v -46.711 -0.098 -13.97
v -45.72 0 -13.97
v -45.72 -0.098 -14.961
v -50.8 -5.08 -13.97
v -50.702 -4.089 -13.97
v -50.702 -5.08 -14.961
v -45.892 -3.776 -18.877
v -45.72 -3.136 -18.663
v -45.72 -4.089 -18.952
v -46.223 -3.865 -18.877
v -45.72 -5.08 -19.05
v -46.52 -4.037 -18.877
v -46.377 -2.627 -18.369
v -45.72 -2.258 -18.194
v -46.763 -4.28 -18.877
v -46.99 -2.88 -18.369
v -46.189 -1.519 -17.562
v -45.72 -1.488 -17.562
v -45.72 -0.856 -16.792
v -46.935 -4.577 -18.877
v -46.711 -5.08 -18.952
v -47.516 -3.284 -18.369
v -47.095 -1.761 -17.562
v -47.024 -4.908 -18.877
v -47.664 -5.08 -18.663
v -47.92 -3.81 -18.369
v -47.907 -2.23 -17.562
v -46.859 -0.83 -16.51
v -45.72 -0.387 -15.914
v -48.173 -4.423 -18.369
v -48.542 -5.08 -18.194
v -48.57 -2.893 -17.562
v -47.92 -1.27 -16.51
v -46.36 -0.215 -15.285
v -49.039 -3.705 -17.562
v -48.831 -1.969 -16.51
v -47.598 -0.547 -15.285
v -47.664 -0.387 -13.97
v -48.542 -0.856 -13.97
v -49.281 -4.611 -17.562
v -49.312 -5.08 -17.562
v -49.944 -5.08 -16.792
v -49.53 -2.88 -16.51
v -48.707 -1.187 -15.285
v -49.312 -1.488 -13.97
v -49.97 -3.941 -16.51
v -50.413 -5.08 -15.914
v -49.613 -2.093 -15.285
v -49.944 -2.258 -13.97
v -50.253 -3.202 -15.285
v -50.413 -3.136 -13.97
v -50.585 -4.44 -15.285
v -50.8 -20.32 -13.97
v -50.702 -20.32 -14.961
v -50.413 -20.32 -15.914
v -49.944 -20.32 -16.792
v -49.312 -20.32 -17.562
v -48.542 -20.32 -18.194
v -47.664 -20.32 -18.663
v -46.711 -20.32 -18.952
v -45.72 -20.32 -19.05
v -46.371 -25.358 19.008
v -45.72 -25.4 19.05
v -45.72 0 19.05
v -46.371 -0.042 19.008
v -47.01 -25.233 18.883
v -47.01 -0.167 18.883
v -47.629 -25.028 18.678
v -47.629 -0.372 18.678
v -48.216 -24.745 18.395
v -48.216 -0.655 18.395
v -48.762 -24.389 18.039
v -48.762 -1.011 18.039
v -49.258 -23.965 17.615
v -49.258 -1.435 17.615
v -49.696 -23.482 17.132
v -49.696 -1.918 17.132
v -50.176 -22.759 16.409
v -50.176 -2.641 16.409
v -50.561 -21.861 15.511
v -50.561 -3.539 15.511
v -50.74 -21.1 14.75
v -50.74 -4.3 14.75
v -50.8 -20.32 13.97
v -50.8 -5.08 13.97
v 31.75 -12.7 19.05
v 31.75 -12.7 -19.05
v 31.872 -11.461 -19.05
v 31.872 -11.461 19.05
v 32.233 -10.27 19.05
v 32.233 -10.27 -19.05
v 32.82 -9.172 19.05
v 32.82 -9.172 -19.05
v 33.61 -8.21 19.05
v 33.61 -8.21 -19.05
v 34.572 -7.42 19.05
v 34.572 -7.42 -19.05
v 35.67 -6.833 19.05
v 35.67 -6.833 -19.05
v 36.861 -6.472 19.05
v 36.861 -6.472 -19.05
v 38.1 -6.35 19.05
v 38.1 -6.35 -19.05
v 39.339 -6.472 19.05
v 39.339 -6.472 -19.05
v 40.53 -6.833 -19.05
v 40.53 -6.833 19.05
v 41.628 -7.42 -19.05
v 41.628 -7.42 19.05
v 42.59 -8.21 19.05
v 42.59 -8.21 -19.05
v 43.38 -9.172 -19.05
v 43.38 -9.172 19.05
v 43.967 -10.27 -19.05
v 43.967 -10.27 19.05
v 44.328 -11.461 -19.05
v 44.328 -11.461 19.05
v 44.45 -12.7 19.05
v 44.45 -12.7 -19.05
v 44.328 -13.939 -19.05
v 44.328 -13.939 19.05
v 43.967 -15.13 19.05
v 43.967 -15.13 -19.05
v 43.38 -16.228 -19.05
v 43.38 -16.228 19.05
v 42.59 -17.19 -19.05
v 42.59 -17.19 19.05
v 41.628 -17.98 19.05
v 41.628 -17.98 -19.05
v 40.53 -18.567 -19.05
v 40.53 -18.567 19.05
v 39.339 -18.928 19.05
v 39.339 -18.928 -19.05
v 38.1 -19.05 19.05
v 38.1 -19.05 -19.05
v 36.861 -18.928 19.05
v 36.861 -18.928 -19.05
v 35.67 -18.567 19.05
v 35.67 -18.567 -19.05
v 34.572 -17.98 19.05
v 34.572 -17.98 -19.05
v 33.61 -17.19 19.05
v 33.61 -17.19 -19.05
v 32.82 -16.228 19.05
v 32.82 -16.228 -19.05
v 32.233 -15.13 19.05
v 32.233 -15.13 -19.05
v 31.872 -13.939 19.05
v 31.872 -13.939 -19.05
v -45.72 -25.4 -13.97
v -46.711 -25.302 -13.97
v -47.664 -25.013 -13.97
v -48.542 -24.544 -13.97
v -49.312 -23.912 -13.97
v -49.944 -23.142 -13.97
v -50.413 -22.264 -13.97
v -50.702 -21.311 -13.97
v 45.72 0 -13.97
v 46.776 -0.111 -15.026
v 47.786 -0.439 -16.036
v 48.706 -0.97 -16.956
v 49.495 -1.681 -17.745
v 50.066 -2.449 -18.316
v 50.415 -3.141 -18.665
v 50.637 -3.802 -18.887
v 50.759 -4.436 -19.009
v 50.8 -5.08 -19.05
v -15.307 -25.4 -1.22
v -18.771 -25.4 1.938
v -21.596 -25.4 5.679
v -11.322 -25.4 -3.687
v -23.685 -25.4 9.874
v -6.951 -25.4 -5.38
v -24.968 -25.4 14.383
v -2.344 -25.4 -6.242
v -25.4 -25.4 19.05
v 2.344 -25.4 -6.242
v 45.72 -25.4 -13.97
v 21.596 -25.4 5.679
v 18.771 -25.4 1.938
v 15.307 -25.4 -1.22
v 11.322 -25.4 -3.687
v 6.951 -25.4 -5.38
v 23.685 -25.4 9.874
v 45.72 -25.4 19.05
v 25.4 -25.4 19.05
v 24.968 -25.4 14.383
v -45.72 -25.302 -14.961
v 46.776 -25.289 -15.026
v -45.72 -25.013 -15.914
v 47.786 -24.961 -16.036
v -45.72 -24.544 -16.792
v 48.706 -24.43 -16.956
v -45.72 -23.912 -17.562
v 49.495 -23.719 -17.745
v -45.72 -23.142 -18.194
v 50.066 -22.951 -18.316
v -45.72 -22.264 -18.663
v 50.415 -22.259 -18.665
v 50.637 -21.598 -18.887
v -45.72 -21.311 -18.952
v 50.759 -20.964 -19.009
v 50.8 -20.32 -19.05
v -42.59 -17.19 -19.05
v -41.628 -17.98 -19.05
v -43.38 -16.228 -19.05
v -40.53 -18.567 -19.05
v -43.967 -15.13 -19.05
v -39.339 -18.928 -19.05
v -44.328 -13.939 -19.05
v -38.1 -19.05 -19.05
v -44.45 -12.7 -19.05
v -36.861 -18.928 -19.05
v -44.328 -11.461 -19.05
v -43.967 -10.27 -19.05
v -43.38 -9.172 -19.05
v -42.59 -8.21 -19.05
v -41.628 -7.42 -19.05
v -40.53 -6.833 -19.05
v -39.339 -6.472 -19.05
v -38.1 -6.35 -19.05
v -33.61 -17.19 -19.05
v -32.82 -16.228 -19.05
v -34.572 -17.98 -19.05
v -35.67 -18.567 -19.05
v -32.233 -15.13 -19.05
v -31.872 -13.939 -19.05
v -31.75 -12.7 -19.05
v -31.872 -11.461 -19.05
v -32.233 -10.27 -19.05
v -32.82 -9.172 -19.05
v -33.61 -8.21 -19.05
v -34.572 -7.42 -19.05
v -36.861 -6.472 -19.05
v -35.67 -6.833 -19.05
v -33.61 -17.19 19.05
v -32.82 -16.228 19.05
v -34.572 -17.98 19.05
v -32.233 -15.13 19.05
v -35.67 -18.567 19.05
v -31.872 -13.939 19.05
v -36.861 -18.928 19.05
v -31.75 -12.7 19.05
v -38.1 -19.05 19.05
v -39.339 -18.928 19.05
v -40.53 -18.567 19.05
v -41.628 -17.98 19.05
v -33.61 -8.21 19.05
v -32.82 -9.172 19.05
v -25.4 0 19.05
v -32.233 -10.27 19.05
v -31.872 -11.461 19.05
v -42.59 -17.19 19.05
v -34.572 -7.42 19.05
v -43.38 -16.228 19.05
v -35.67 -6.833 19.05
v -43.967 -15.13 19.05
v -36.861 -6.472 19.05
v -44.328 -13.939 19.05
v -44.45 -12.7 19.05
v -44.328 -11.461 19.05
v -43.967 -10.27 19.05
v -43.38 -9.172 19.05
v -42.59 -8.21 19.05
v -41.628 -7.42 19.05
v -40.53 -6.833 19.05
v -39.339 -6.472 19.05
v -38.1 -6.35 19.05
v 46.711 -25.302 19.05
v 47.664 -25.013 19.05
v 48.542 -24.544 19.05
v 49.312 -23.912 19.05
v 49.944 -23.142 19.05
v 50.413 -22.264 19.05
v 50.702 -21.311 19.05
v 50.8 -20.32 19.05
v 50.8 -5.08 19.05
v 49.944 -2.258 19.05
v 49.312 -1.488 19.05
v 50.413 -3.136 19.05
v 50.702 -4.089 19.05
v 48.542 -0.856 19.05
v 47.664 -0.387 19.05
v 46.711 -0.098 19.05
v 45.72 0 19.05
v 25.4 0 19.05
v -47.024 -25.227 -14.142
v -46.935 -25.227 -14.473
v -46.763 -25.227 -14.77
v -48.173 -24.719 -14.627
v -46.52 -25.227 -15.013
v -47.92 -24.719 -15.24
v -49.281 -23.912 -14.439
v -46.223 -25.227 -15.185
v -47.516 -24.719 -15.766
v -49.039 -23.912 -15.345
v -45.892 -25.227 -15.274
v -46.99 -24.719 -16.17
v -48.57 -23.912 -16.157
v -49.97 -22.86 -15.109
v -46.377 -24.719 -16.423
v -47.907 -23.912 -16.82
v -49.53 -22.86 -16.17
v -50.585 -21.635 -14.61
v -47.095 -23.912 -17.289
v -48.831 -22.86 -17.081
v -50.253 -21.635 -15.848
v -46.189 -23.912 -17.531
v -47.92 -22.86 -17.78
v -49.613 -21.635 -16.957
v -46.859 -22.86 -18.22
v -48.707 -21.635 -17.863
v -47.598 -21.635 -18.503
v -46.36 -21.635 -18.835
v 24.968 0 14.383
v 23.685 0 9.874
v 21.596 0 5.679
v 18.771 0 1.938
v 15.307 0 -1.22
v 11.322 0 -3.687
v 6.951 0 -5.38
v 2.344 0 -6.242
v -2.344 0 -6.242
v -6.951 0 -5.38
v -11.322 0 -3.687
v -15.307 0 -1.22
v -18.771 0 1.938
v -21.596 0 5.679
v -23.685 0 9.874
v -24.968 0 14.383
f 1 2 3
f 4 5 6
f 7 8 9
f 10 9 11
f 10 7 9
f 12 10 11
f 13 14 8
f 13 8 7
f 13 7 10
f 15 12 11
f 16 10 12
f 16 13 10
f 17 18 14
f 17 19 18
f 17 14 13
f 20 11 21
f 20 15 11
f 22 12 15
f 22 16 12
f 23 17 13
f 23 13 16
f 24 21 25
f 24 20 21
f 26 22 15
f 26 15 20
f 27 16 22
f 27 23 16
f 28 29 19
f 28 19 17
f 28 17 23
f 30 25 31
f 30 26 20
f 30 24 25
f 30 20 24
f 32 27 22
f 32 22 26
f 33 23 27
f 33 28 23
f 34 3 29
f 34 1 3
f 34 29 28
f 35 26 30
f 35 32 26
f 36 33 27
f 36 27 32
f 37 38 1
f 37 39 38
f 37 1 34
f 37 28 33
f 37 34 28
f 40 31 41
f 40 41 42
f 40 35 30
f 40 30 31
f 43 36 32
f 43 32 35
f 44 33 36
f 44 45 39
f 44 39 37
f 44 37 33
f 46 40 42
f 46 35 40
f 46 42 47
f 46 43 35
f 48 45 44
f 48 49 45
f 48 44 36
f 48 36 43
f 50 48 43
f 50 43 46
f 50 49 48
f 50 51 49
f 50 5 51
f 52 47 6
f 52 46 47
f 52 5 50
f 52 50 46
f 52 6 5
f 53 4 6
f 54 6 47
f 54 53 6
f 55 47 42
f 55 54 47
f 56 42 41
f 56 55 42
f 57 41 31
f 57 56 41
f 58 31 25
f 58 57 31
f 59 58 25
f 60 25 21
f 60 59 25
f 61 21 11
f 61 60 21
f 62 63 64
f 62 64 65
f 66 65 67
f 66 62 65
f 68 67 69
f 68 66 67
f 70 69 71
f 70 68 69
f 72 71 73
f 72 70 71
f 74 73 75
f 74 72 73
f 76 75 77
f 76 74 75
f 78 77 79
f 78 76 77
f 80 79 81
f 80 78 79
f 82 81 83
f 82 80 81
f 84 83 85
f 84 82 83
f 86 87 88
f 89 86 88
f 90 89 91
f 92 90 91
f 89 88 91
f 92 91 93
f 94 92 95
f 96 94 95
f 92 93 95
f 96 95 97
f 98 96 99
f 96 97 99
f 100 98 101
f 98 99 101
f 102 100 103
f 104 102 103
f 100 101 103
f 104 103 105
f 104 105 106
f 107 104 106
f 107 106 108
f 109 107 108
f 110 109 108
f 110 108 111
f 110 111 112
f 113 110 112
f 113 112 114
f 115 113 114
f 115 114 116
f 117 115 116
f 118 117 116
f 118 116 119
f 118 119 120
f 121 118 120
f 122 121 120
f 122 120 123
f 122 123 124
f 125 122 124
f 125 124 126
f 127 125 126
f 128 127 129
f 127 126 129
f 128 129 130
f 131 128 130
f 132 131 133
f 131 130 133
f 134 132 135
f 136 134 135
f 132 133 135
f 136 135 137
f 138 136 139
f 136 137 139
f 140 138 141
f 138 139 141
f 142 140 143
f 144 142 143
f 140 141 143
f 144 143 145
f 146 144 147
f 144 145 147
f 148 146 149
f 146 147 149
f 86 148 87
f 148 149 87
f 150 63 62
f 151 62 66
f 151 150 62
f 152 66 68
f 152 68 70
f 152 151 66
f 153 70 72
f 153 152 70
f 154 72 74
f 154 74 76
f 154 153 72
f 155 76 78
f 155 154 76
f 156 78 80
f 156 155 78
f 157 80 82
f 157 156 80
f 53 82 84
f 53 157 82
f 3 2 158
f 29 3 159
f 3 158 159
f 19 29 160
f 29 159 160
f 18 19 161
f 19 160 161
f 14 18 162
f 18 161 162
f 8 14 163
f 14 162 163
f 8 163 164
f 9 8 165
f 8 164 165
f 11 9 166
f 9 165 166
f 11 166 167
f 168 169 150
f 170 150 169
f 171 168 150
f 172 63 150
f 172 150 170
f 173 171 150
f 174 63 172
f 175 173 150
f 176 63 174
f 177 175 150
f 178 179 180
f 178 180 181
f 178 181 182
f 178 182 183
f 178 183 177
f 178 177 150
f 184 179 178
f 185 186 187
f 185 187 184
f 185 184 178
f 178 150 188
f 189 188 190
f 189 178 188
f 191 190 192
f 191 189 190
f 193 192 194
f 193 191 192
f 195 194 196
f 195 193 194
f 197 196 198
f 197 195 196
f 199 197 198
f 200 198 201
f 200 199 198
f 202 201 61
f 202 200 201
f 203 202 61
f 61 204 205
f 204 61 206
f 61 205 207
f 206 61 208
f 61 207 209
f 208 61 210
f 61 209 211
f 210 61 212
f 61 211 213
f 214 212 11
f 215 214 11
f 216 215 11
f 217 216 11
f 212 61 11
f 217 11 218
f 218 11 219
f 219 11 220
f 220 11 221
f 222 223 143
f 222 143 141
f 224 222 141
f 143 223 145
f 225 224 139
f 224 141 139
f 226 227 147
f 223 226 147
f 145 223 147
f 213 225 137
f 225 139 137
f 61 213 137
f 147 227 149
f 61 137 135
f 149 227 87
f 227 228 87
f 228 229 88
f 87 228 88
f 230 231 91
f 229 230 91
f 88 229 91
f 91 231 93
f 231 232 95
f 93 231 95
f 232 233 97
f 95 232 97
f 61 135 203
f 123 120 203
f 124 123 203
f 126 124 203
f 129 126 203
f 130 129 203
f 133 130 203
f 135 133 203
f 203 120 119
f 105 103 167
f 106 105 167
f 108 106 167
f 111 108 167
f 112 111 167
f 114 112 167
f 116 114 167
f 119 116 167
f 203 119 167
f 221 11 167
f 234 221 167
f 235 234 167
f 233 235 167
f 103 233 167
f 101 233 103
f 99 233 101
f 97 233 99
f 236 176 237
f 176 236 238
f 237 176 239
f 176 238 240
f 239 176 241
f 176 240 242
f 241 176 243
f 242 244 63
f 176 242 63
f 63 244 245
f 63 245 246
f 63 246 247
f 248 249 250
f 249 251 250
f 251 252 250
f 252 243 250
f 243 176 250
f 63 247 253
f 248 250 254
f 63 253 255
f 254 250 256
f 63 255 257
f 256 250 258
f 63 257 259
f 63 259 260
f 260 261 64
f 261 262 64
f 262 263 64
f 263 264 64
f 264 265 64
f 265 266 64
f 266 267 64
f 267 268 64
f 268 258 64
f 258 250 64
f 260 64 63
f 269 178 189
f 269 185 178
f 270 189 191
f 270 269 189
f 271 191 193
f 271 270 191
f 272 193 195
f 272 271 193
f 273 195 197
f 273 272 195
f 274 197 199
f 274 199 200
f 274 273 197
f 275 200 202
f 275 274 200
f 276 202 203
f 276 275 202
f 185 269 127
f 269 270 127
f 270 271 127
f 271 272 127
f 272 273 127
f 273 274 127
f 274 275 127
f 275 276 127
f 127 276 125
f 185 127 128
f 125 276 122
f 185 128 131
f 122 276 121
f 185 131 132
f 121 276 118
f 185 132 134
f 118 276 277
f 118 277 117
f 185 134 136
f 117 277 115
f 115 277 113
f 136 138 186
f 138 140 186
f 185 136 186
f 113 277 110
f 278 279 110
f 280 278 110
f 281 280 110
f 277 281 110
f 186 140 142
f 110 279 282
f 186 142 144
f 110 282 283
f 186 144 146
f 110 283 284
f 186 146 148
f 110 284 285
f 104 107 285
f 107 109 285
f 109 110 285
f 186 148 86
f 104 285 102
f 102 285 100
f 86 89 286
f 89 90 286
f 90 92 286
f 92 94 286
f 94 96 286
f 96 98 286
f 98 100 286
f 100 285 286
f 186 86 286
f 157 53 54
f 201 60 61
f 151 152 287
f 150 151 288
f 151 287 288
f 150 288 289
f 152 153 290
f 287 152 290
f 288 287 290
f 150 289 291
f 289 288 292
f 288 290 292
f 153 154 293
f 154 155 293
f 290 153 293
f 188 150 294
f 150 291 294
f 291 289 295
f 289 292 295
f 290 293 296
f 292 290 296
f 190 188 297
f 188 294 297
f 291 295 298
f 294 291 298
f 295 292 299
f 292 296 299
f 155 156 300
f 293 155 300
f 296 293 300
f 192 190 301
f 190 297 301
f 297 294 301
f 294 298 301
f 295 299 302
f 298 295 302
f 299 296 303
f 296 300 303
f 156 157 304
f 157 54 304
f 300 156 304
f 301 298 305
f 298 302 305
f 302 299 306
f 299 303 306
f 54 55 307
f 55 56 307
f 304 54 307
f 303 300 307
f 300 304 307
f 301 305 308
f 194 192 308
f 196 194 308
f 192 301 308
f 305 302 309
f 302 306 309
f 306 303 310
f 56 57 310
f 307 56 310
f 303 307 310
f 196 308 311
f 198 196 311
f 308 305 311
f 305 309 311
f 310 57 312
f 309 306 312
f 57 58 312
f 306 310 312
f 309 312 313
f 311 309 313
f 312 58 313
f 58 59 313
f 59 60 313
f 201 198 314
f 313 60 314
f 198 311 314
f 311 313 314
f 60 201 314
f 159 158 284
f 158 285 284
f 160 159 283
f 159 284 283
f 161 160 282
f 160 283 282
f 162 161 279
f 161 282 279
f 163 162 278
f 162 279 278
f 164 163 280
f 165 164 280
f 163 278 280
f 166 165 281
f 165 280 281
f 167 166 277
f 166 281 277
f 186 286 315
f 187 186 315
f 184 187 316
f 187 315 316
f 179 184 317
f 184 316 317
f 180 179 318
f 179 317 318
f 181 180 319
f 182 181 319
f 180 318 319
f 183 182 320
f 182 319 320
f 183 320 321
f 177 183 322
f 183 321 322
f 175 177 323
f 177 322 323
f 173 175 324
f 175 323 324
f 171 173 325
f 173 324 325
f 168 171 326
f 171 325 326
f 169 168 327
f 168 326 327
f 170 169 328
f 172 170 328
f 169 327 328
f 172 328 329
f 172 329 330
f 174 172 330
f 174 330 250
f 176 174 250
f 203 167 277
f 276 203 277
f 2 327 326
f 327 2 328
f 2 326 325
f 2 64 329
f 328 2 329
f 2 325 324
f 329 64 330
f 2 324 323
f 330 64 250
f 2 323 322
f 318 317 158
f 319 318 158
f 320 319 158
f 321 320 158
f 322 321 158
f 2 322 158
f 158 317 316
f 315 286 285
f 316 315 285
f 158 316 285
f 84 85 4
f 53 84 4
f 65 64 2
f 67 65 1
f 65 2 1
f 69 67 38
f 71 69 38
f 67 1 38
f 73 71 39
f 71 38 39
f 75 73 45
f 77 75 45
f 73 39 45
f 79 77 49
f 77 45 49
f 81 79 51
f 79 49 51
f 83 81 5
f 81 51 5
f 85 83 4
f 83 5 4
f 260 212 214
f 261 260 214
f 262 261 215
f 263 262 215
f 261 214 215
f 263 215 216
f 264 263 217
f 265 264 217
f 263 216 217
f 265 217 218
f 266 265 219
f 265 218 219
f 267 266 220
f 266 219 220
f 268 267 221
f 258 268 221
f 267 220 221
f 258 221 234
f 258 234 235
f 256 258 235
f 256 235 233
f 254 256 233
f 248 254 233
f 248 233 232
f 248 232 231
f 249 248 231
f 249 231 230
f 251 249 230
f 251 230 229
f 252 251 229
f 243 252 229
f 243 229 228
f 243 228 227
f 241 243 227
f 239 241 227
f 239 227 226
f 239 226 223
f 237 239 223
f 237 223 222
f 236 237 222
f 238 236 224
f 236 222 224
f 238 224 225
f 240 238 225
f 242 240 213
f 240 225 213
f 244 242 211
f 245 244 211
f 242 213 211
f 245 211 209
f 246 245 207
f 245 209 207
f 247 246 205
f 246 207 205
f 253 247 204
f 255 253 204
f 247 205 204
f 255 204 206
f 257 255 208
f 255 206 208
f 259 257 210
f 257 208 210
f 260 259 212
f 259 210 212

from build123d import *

# Parameters (mm, degrees)
F1_DEPTH = 25.4
F3_D     = 12.7
F4_D     = 12.7
F5_R     = 5.08


with BuildPart() as f1:
    # F0 (on Front) → F1 (new body)
    with BuildSketch(Plane.XZ):
        with BuildLine():
            Line((-25.4, 19.05), (-50.8, 19.05))
            Line((-50.8, 19.05), (-50.8, -19.05))
            Line((-50.8, -19.05), (50.8, -19.05))
            Line((50.8, -19.05), (50.8, 19.05))
            Line((50.8, 19.05), (25.4, 19.05))
            ThreePointArc((25.4, 19.05), (0, -6.35), (-25.4, 19.05))
        make_face()
    extrude(amount=F1_DEPTH)

    # F3 (through all)
    with Locations(Plane.XY.offset(19.05)):
        with Locations((-38.1, -12.7)):
            Hole(F3_D / 2)

    # F4 (through all)
    with Locations(Plane.XY.offset(19.05)):
        with Locations((38.1, -12.7)):
            Hole(F4_D / 2)

    # F5
    f5_edges = [f1.edges().sort_by_distance(p)[0] for p in [
        (50.8, 0, 0),
        (-50.8, 0, 0),
        (0, 0, -19.05),
        (-50.8, -12.7, -19.05),
        (-50.8, -12.7, 19.05),
        (-50.8, -25.4, 0),
        (0, -25.4, -19.05),
        (50.8, -25.4, 0),
    ]]
    fillet(f5_edges, radius=F5_R)


solid = f1.part
